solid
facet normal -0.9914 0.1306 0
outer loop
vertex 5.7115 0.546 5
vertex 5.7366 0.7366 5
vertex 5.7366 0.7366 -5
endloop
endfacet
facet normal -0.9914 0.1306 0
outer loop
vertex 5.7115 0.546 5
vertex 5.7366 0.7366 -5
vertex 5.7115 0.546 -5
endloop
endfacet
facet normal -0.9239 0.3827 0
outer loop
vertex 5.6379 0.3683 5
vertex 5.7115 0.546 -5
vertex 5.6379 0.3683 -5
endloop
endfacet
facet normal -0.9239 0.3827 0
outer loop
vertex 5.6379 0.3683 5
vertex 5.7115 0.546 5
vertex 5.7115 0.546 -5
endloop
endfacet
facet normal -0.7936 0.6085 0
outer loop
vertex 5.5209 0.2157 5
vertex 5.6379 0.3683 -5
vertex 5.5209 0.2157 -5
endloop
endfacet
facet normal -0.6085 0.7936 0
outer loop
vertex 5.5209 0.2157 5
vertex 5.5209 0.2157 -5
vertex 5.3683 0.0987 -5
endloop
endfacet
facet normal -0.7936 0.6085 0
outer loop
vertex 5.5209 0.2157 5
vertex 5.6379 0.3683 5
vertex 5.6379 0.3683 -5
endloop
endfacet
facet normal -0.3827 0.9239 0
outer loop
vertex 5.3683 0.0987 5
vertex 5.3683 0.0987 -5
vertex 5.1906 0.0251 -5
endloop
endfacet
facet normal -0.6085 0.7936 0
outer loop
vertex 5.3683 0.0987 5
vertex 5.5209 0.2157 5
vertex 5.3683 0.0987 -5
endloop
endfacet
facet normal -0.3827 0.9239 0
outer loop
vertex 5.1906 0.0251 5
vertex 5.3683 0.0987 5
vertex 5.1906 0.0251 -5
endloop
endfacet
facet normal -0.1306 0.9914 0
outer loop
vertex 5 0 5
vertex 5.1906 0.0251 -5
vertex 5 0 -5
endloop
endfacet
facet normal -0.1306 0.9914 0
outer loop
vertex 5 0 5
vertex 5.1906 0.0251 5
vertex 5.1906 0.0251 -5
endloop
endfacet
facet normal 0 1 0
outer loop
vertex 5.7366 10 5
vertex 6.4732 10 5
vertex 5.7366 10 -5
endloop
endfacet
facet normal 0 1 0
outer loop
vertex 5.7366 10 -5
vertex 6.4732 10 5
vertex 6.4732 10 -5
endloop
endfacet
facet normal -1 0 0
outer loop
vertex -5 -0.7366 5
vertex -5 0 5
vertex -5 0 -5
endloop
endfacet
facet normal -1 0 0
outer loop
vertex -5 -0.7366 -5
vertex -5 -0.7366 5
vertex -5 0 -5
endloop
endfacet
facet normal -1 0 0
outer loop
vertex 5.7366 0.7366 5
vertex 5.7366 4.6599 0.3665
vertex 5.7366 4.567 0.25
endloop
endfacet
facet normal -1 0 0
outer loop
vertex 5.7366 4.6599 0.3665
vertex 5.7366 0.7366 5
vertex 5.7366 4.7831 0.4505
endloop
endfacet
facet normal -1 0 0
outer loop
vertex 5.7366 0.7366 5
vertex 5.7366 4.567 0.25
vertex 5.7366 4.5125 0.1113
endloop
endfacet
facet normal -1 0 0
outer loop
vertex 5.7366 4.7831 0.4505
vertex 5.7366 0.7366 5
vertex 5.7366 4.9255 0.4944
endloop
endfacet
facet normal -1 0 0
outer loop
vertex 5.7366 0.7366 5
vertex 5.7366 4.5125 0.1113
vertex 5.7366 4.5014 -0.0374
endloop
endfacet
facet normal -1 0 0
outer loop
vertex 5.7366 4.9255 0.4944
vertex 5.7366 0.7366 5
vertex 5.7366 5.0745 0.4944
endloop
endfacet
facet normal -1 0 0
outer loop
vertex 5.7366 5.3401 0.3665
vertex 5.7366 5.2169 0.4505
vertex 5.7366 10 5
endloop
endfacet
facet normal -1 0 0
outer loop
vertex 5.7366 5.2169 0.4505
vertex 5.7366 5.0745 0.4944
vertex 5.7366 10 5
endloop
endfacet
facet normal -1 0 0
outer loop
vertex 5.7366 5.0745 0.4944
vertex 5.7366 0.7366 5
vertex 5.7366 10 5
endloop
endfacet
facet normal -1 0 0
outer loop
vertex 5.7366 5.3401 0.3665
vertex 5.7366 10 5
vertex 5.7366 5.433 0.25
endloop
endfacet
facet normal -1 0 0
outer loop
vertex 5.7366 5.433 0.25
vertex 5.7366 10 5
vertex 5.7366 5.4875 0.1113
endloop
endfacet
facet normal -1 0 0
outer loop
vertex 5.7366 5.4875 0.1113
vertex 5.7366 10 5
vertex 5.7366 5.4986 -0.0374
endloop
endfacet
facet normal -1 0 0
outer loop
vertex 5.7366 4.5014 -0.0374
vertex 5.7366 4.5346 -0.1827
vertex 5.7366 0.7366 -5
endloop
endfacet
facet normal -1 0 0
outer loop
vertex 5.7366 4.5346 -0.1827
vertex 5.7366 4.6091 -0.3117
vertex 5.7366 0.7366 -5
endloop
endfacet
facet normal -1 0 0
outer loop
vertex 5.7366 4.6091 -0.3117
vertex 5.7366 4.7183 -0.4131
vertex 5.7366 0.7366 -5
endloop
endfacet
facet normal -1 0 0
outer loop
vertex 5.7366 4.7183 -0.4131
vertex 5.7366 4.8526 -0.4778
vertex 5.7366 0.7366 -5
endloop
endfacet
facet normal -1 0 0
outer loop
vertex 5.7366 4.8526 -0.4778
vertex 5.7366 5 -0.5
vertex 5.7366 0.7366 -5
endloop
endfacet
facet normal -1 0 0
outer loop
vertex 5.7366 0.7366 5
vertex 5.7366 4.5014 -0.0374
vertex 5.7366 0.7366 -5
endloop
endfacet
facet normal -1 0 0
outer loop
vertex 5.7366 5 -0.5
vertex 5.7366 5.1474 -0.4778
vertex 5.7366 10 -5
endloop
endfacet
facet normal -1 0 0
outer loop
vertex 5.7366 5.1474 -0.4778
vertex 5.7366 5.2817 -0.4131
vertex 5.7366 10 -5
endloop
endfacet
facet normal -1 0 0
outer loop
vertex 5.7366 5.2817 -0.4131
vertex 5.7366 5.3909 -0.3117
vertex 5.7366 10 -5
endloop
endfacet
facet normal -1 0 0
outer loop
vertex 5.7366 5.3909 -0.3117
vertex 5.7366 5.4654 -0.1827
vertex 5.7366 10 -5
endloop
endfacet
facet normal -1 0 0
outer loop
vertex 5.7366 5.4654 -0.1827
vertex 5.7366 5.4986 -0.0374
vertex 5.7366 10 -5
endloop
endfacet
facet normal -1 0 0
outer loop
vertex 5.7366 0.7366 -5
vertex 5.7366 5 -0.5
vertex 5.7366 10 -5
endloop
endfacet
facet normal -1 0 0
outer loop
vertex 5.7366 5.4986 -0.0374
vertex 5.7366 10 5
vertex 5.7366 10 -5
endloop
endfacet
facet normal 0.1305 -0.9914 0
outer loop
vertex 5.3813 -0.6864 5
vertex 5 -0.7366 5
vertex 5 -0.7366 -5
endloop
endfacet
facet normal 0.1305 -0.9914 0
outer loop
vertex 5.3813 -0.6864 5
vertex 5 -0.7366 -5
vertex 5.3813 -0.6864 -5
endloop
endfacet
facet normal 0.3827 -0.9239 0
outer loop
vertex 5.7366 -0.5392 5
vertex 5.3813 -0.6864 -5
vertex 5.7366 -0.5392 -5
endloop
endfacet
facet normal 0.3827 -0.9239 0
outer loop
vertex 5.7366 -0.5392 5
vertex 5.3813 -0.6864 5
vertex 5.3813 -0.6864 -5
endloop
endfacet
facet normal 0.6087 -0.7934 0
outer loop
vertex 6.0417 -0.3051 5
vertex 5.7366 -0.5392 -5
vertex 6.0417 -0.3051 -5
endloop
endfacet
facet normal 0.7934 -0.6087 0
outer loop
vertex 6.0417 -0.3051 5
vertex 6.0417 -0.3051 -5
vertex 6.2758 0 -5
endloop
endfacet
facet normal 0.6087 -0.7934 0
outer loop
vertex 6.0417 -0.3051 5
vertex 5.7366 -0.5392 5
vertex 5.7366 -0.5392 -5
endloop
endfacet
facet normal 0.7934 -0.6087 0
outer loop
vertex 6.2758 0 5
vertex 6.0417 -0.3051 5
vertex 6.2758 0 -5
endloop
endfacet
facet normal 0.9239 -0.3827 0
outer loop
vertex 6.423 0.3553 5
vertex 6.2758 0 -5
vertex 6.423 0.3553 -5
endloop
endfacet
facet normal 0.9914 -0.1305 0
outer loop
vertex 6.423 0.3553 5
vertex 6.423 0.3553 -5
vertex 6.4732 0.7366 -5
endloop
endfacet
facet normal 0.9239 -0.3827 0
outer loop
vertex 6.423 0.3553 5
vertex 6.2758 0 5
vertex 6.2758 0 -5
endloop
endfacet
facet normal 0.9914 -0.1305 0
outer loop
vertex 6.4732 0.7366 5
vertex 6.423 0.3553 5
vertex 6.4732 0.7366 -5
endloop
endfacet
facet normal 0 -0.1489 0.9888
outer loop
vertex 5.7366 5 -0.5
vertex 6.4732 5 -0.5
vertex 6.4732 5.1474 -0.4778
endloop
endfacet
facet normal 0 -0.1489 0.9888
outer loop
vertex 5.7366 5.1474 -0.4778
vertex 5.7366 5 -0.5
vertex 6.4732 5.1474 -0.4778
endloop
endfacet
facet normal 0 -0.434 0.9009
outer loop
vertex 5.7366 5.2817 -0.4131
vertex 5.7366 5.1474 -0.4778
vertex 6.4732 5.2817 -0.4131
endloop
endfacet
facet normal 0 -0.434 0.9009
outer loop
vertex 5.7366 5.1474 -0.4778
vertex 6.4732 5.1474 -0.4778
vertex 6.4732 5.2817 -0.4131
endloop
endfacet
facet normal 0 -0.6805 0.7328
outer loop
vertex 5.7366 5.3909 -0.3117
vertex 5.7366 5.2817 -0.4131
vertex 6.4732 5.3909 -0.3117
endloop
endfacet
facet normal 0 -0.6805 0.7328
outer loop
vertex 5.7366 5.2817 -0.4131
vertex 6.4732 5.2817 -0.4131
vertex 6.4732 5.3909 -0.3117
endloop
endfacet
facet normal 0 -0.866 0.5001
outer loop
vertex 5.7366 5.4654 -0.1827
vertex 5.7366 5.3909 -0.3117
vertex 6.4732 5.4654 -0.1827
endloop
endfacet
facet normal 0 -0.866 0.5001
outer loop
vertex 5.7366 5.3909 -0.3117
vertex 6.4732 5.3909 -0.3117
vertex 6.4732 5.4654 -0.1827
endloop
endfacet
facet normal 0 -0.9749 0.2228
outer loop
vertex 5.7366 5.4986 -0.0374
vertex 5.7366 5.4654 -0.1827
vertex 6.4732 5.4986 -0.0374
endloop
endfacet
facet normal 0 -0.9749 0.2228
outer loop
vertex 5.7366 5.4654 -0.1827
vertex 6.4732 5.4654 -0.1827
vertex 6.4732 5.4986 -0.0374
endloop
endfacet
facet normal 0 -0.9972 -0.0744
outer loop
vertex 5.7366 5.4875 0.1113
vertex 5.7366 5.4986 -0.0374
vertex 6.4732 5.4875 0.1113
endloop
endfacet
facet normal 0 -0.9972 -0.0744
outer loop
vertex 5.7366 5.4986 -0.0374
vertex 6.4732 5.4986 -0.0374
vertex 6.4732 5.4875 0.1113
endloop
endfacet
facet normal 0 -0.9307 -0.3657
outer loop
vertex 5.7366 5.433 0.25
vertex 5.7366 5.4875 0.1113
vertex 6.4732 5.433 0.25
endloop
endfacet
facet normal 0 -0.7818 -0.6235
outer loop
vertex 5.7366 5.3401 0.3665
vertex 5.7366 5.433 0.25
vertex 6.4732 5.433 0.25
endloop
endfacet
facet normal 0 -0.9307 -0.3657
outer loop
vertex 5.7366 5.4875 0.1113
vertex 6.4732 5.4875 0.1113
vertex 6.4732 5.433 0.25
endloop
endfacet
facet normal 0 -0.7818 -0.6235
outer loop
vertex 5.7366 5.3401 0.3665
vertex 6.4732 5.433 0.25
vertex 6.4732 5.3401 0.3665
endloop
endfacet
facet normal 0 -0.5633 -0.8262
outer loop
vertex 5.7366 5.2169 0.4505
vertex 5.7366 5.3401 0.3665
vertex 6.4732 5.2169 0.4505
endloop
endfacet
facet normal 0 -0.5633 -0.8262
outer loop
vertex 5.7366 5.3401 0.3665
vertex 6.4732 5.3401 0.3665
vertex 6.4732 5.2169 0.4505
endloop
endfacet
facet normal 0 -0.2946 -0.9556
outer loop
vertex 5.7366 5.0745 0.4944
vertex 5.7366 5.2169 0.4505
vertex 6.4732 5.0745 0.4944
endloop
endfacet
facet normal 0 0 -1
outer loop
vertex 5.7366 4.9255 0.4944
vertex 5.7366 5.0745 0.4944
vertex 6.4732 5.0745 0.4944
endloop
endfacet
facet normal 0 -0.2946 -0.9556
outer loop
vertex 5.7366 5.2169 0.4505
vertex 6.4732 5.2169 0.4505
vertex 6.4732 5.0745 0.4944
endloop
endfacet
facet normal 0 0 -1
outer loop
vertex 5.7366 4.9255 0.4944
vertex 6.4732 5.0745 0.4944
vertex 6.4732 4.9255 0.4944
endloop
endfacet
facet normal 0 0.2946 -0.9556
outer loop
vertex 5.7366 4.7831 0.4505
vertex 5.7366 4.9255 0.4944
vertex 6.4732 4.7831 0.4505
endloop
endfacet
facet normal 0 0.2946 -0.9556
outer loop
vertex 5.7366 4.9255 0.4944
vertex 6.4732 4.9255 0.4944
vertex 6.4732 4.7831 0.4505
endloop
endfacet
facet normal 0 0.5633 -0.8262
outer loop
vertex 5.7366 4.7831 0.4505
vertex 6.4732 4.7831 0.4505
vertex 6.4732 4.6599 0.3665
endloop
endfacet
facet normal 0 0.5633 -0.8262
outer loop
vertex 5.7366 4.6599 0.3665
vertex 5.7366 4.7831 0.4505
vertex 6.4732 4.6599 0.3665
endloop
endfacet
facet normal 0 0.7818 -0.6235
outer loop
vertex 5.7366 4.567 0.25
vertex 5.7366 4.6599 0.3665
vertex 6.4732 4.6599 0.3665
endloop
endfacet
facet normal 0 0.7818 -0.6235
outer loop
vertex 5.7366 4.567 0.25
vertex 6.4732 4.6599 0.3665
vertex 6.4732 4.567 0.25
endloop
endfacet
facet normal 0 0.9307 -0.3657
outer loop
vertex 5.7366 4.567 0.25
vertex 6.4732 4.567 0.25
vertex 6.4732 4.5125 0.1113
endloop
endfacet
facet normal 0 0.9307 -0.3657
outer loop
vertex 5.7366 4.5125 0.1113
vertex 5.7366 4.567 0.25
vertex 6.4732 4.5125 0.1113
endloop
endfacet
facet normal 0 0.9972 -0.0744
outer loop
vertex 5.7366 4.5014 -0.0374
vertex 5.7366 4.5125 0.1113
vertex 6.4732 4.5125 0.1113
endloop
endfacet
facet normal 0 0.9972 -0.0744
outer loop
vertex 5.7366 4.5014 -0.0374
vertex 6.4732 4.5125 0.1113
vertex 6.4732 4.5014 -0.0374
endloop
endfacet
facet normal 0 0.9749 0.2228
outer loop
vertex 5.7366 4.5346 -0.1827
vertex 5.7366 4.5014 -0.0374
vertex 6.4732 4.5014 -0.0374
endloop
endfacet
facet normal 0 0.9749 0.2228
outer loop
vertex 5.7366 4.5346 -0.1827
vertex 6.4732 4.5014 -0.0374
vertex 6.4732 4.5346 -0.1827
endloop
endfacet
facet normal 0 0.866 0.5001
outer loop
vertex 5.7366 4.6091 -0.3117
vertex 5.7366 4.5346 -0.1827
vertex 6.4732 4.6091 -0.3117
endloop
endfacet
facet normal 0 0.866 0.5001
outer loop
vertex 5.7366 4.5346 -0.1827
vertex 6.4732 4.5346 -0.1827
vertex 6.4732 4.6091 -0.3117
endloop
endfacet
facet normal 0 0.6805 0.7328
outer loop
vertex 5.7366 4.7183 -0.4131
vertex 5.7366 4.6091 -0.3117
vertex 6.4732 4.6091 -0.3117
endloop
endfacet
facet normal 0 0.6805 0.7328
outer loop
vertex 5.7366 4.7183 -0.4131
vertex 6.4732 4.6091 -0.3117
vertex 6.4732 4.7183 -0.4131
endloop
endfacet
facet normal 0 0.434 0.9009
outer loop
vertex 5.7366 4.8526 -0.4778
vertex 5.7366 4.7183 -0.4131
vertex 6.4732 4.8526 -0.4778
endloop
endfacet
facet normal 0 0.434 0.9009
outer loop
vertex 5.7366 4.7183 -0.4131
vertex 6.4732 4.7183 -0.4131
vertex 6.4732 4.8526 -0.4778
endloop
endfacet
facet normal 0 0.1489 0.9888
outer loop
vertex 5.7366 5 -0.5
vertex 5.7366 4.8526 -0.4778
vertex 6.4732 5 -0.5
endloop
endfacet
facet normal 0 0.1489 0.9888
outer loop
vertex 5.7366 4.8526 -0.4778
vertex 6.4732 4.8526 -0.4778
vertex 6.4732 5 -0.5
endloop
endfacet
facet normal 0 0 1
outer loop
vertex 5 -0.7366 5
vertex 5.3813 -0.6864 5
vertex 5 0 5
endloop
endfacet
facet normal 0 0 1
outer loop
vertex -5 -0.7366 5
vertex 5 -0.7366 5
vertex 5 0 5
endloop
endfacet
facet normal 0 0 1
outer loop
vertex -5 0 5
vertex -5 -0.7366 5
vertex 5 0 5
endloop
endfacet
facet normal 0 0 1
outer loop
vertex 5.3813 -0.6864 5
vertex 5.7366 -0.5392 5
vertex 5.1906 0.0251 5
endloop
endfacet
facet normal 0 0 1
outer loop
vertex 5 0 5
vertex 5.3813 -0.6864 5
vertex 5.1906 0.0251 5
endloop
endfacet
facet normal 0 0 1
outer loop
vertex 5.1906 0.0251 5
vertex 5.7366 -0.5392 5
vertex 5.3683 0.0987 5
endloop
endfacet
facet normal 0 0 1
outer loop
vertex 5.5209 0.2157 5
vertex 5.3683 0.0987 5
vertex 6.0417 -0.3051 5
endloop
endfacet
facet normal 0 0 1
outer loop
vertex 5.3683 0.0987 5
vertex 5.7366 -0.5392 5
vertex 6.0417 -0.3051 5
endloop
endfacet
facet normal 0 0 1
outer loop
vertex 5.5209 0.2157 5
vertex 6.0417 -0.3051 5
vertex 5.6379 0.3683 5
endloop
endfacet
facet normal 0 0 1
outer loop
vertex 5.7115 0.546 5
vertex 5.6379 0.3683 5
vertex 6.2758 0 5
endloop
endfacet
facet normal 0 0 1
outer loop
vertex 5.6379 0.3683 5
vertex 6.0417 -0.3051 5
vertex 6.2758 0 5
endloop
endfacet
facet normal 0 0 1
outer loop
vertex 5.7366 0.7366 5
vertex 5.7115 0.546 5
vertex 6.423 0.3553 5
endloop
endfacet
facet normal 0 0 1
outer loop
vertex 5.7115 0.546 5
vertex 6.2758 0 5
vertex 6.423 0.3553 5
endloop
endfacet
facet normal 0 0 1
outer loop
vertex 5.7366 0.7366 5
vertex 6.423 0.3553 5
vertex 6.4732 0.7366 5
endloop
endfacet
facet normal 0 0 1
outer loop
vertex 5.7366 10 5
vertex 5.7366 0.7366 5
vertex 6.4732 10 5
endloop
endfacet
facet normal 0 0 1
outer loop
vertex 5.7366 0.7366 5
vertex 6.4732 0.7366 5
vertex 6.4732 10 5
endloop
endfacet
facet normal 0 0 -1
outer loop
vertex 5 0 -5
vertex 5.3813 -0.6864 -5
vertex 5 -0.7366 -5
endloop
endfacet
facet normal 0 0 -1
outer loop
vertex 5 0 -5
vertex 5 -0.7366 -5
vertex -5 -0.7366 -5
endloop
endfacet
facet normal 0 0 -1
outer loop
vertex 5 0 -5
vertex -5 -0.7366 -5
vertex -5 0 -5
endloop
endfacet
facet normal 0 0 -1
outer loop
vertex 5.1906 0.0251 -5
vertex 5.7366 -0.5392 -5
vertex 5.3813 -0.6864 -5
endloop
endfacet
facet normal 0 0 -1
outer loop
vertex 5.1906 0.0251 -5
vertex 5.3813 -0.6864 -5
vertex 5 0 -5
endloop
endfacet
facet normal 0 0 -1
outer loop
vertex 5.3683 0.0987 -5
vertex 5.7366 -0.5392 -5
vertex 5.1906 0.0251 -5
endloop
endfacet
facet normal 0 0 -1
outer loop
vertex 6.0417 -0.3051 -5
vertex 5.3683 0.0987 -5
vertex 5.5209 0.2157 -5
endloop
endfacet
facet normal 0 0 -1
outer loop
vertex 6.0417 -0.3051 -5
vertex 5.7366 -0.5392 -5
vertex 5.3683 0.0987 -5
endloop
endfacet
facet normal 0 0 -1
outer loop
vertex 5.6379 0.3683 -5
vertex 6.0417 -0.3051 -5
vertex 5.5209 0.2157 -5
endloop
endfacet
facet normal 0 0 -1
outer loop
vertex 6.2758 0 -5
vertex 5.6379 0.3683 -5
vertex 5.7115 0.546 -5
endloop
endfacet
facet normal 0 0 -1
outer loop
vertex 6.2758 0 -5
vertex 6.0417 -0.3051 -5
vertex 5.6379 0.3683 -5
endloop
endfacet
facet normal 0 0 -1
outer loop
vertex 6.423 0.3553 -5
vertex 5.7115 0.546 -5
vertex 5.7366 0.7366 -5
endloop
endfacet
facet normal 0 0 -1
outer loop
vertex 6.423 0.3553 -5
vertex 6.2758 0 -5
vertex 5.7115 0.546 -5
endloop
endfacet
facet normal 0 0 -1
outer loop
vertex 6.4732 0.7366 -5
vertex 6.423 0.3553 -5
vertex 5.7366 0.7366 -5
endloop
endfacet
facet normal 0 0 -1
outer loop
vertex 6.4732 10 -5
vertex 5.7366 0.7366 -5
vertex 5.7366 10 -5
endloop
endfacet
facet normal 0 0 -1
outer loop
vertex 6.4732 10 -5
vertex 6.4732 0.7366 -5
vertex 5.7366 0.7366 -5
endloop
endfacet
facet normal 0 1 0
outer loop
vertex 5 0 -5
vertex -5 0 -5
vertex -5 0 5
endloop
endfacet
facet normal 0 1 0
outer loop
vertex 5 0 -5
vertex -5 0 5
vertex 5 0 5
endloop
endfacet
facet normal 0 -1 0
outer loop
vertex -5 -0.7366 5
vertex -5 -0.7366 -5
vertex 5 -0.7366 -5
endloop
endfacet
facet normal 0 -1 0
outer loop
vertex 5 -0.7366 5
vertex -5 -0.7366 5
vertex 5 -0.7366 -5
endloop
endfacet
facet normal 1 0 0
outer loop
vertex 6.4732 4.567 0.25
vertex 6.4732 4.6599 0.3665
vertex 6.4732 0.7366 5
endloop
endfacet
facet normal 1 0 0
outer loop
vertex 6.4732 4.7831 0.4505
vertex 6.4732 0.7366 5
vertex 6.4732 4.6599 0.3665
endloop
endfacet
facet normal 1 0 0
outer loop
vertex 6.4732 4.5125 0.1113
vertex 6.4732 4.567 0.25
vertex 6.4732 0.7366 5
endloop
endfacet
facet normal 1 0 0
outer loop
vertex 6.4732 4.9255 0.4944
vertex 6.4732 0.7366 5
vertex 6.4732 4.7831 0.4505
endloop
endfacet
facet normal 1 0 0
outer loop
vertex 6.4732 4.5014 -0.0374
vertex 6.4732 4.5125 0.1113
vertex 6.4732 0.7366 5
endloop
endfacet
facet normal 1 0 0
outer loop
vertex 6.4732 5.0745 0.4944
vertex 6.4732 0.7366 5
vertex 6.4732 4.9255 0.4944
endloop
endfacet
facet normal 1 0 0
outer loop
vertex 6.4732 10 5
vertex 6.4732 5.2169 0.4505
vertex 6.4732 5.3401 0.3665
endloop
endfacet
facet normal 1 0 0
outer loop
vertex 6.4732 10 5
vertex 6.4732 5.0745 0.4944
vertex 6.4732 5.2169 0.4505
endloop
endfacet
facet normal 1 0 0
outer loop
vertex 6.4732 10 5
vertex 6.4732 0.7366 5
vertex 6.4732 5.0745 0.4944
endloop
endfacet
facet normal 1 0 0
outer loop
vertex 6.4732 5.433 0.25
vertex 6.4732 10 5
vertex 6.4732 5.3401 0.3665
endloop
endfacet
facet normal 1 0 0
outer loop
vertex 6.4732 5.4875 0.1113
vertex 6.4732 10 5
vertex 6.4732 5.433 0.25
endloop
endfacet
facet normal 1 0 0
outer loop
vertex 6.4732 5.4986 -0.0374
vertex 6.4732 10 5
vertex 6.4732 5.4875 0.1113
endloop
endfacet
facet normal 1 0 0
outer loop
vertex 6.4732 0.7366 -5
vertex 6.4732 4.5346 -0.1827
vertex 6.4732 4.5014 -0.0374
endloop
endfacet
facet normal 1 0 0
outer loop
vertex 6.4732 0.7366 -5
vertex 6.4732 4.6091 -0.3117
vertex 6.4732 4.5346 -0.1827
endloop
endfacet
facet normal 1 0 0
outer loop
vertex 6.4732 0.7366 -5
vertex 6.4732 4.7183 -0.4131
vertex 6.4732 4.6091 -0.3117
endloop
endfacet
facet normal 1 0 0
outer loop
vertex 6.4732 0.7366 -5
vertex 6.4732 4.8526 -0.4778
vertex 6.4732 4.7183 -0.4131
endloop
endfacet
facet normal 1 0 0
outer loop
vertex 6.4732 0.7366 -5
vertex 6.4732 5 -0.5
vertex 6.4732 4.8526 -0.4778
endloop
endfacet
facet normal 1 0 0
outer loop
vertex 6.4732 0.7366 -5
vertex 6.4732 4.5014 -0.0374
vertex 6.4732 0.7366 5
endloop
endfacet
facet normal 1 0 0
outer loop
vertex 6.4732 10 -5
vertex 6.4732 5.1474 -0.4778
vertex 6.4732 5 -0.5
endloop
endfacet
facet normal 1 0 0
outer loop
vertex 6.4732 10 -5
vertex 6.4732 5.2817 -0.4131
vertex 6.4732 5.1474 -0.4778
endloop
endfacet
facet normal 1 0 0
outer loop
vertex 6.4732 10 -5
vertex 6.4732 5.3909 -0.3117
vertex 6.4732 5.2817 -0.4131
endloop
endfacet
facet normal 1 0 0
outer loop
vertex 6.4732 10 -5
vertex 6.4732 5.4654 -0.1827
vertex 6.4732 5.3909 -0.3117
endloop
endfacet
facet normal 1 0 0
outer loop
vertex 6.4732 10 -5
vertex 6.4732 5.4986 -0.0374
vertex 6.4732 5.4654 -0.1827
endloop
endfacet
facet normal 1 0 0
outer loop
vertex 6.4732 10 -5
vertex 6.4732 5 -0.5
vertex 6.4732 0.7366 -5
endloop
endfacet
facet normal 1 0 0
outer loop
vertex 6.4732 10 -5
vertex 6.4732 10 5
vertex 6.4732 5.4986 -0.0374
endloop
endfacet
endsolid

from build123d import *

# Parameters (mm, degrees)
SKETCH1_W               = 10
SKETCH1_H               = 10
BASE_FLANGE1_DEPTH      = 0.7366
EDGE_FLANGE1_DEPTH      = 10
EDGE_FLANGE1_START      = 0.7366
EDGE_FLANGE1_PROFILE_W  = 10
EDGE_FLANGE1_PROFILE_H  = 9.2634
EDGE_FLANGE1_PROFILE_R  = 0.5
EDGE_FLANGE1_FLAT_DEPTH = 0.7366


# Sheet-metal steps are written as plain solids
with BuildPart() as part:
    # Sketch1 → Base-Flange1 (new body)
    with BuildSketch(Plane(origin=(0, 0, 0), x_dir=(1, 0, 0), z_dir=(0, 1, 0))):
        Rectangle(SKETCH1_W, SKETCH1_H)
    extrude(amount=-BASE_FLANGE1_DEPTH)

    # Edge-Flange1 bend section (across the edge) → Edge-Flange1 (add)
    with BuildSketch(Plane(origin=(5.7366, 0, 5), x_dir=(-1, 0, 0), z_dir=(0, 0, -1))):
        with BuildLine():
            Line((-0.7366, 0.7366), (0, 0.7366))
            ThreePointArc((0, 0.7366), (0.215745145, 0.215745145), (0.7366, 0))
            Line((0.7366, 0), (0.7366, -0.7366))
            ThreePointArc((0.7366, -0.7366), (-0.30510971, -0.30510971), (-0.7366, 0.7366))
        make_face()
    extrude(amount=EDGE_FLANGE1_DEPTH)

    # Edge-Flange1 profile (on flange) → Edge-Flange1 flat (add)
    with BuildSketch(Plane(origin=(5.7366, 0, 0), x_dir=(0, 0, -1), z_dir=(1, 0, 0)).offset(EDGE_FLANGE1_START)):
        with Locations((0, 5.3683)):
            Rectangle(EDGE_FLANGE1_PROFILE_W, EDGE_FLANGE1_PROFILE_H)
        with Locations((0, 5)):
            Circle(EDGE_FLANGE1_PROFILE_R, mode=Mode.SUBTRACT)
    extrude(amount=-EDGE_FLANGE1_FLAT_DEPTH)


solid = part.part
